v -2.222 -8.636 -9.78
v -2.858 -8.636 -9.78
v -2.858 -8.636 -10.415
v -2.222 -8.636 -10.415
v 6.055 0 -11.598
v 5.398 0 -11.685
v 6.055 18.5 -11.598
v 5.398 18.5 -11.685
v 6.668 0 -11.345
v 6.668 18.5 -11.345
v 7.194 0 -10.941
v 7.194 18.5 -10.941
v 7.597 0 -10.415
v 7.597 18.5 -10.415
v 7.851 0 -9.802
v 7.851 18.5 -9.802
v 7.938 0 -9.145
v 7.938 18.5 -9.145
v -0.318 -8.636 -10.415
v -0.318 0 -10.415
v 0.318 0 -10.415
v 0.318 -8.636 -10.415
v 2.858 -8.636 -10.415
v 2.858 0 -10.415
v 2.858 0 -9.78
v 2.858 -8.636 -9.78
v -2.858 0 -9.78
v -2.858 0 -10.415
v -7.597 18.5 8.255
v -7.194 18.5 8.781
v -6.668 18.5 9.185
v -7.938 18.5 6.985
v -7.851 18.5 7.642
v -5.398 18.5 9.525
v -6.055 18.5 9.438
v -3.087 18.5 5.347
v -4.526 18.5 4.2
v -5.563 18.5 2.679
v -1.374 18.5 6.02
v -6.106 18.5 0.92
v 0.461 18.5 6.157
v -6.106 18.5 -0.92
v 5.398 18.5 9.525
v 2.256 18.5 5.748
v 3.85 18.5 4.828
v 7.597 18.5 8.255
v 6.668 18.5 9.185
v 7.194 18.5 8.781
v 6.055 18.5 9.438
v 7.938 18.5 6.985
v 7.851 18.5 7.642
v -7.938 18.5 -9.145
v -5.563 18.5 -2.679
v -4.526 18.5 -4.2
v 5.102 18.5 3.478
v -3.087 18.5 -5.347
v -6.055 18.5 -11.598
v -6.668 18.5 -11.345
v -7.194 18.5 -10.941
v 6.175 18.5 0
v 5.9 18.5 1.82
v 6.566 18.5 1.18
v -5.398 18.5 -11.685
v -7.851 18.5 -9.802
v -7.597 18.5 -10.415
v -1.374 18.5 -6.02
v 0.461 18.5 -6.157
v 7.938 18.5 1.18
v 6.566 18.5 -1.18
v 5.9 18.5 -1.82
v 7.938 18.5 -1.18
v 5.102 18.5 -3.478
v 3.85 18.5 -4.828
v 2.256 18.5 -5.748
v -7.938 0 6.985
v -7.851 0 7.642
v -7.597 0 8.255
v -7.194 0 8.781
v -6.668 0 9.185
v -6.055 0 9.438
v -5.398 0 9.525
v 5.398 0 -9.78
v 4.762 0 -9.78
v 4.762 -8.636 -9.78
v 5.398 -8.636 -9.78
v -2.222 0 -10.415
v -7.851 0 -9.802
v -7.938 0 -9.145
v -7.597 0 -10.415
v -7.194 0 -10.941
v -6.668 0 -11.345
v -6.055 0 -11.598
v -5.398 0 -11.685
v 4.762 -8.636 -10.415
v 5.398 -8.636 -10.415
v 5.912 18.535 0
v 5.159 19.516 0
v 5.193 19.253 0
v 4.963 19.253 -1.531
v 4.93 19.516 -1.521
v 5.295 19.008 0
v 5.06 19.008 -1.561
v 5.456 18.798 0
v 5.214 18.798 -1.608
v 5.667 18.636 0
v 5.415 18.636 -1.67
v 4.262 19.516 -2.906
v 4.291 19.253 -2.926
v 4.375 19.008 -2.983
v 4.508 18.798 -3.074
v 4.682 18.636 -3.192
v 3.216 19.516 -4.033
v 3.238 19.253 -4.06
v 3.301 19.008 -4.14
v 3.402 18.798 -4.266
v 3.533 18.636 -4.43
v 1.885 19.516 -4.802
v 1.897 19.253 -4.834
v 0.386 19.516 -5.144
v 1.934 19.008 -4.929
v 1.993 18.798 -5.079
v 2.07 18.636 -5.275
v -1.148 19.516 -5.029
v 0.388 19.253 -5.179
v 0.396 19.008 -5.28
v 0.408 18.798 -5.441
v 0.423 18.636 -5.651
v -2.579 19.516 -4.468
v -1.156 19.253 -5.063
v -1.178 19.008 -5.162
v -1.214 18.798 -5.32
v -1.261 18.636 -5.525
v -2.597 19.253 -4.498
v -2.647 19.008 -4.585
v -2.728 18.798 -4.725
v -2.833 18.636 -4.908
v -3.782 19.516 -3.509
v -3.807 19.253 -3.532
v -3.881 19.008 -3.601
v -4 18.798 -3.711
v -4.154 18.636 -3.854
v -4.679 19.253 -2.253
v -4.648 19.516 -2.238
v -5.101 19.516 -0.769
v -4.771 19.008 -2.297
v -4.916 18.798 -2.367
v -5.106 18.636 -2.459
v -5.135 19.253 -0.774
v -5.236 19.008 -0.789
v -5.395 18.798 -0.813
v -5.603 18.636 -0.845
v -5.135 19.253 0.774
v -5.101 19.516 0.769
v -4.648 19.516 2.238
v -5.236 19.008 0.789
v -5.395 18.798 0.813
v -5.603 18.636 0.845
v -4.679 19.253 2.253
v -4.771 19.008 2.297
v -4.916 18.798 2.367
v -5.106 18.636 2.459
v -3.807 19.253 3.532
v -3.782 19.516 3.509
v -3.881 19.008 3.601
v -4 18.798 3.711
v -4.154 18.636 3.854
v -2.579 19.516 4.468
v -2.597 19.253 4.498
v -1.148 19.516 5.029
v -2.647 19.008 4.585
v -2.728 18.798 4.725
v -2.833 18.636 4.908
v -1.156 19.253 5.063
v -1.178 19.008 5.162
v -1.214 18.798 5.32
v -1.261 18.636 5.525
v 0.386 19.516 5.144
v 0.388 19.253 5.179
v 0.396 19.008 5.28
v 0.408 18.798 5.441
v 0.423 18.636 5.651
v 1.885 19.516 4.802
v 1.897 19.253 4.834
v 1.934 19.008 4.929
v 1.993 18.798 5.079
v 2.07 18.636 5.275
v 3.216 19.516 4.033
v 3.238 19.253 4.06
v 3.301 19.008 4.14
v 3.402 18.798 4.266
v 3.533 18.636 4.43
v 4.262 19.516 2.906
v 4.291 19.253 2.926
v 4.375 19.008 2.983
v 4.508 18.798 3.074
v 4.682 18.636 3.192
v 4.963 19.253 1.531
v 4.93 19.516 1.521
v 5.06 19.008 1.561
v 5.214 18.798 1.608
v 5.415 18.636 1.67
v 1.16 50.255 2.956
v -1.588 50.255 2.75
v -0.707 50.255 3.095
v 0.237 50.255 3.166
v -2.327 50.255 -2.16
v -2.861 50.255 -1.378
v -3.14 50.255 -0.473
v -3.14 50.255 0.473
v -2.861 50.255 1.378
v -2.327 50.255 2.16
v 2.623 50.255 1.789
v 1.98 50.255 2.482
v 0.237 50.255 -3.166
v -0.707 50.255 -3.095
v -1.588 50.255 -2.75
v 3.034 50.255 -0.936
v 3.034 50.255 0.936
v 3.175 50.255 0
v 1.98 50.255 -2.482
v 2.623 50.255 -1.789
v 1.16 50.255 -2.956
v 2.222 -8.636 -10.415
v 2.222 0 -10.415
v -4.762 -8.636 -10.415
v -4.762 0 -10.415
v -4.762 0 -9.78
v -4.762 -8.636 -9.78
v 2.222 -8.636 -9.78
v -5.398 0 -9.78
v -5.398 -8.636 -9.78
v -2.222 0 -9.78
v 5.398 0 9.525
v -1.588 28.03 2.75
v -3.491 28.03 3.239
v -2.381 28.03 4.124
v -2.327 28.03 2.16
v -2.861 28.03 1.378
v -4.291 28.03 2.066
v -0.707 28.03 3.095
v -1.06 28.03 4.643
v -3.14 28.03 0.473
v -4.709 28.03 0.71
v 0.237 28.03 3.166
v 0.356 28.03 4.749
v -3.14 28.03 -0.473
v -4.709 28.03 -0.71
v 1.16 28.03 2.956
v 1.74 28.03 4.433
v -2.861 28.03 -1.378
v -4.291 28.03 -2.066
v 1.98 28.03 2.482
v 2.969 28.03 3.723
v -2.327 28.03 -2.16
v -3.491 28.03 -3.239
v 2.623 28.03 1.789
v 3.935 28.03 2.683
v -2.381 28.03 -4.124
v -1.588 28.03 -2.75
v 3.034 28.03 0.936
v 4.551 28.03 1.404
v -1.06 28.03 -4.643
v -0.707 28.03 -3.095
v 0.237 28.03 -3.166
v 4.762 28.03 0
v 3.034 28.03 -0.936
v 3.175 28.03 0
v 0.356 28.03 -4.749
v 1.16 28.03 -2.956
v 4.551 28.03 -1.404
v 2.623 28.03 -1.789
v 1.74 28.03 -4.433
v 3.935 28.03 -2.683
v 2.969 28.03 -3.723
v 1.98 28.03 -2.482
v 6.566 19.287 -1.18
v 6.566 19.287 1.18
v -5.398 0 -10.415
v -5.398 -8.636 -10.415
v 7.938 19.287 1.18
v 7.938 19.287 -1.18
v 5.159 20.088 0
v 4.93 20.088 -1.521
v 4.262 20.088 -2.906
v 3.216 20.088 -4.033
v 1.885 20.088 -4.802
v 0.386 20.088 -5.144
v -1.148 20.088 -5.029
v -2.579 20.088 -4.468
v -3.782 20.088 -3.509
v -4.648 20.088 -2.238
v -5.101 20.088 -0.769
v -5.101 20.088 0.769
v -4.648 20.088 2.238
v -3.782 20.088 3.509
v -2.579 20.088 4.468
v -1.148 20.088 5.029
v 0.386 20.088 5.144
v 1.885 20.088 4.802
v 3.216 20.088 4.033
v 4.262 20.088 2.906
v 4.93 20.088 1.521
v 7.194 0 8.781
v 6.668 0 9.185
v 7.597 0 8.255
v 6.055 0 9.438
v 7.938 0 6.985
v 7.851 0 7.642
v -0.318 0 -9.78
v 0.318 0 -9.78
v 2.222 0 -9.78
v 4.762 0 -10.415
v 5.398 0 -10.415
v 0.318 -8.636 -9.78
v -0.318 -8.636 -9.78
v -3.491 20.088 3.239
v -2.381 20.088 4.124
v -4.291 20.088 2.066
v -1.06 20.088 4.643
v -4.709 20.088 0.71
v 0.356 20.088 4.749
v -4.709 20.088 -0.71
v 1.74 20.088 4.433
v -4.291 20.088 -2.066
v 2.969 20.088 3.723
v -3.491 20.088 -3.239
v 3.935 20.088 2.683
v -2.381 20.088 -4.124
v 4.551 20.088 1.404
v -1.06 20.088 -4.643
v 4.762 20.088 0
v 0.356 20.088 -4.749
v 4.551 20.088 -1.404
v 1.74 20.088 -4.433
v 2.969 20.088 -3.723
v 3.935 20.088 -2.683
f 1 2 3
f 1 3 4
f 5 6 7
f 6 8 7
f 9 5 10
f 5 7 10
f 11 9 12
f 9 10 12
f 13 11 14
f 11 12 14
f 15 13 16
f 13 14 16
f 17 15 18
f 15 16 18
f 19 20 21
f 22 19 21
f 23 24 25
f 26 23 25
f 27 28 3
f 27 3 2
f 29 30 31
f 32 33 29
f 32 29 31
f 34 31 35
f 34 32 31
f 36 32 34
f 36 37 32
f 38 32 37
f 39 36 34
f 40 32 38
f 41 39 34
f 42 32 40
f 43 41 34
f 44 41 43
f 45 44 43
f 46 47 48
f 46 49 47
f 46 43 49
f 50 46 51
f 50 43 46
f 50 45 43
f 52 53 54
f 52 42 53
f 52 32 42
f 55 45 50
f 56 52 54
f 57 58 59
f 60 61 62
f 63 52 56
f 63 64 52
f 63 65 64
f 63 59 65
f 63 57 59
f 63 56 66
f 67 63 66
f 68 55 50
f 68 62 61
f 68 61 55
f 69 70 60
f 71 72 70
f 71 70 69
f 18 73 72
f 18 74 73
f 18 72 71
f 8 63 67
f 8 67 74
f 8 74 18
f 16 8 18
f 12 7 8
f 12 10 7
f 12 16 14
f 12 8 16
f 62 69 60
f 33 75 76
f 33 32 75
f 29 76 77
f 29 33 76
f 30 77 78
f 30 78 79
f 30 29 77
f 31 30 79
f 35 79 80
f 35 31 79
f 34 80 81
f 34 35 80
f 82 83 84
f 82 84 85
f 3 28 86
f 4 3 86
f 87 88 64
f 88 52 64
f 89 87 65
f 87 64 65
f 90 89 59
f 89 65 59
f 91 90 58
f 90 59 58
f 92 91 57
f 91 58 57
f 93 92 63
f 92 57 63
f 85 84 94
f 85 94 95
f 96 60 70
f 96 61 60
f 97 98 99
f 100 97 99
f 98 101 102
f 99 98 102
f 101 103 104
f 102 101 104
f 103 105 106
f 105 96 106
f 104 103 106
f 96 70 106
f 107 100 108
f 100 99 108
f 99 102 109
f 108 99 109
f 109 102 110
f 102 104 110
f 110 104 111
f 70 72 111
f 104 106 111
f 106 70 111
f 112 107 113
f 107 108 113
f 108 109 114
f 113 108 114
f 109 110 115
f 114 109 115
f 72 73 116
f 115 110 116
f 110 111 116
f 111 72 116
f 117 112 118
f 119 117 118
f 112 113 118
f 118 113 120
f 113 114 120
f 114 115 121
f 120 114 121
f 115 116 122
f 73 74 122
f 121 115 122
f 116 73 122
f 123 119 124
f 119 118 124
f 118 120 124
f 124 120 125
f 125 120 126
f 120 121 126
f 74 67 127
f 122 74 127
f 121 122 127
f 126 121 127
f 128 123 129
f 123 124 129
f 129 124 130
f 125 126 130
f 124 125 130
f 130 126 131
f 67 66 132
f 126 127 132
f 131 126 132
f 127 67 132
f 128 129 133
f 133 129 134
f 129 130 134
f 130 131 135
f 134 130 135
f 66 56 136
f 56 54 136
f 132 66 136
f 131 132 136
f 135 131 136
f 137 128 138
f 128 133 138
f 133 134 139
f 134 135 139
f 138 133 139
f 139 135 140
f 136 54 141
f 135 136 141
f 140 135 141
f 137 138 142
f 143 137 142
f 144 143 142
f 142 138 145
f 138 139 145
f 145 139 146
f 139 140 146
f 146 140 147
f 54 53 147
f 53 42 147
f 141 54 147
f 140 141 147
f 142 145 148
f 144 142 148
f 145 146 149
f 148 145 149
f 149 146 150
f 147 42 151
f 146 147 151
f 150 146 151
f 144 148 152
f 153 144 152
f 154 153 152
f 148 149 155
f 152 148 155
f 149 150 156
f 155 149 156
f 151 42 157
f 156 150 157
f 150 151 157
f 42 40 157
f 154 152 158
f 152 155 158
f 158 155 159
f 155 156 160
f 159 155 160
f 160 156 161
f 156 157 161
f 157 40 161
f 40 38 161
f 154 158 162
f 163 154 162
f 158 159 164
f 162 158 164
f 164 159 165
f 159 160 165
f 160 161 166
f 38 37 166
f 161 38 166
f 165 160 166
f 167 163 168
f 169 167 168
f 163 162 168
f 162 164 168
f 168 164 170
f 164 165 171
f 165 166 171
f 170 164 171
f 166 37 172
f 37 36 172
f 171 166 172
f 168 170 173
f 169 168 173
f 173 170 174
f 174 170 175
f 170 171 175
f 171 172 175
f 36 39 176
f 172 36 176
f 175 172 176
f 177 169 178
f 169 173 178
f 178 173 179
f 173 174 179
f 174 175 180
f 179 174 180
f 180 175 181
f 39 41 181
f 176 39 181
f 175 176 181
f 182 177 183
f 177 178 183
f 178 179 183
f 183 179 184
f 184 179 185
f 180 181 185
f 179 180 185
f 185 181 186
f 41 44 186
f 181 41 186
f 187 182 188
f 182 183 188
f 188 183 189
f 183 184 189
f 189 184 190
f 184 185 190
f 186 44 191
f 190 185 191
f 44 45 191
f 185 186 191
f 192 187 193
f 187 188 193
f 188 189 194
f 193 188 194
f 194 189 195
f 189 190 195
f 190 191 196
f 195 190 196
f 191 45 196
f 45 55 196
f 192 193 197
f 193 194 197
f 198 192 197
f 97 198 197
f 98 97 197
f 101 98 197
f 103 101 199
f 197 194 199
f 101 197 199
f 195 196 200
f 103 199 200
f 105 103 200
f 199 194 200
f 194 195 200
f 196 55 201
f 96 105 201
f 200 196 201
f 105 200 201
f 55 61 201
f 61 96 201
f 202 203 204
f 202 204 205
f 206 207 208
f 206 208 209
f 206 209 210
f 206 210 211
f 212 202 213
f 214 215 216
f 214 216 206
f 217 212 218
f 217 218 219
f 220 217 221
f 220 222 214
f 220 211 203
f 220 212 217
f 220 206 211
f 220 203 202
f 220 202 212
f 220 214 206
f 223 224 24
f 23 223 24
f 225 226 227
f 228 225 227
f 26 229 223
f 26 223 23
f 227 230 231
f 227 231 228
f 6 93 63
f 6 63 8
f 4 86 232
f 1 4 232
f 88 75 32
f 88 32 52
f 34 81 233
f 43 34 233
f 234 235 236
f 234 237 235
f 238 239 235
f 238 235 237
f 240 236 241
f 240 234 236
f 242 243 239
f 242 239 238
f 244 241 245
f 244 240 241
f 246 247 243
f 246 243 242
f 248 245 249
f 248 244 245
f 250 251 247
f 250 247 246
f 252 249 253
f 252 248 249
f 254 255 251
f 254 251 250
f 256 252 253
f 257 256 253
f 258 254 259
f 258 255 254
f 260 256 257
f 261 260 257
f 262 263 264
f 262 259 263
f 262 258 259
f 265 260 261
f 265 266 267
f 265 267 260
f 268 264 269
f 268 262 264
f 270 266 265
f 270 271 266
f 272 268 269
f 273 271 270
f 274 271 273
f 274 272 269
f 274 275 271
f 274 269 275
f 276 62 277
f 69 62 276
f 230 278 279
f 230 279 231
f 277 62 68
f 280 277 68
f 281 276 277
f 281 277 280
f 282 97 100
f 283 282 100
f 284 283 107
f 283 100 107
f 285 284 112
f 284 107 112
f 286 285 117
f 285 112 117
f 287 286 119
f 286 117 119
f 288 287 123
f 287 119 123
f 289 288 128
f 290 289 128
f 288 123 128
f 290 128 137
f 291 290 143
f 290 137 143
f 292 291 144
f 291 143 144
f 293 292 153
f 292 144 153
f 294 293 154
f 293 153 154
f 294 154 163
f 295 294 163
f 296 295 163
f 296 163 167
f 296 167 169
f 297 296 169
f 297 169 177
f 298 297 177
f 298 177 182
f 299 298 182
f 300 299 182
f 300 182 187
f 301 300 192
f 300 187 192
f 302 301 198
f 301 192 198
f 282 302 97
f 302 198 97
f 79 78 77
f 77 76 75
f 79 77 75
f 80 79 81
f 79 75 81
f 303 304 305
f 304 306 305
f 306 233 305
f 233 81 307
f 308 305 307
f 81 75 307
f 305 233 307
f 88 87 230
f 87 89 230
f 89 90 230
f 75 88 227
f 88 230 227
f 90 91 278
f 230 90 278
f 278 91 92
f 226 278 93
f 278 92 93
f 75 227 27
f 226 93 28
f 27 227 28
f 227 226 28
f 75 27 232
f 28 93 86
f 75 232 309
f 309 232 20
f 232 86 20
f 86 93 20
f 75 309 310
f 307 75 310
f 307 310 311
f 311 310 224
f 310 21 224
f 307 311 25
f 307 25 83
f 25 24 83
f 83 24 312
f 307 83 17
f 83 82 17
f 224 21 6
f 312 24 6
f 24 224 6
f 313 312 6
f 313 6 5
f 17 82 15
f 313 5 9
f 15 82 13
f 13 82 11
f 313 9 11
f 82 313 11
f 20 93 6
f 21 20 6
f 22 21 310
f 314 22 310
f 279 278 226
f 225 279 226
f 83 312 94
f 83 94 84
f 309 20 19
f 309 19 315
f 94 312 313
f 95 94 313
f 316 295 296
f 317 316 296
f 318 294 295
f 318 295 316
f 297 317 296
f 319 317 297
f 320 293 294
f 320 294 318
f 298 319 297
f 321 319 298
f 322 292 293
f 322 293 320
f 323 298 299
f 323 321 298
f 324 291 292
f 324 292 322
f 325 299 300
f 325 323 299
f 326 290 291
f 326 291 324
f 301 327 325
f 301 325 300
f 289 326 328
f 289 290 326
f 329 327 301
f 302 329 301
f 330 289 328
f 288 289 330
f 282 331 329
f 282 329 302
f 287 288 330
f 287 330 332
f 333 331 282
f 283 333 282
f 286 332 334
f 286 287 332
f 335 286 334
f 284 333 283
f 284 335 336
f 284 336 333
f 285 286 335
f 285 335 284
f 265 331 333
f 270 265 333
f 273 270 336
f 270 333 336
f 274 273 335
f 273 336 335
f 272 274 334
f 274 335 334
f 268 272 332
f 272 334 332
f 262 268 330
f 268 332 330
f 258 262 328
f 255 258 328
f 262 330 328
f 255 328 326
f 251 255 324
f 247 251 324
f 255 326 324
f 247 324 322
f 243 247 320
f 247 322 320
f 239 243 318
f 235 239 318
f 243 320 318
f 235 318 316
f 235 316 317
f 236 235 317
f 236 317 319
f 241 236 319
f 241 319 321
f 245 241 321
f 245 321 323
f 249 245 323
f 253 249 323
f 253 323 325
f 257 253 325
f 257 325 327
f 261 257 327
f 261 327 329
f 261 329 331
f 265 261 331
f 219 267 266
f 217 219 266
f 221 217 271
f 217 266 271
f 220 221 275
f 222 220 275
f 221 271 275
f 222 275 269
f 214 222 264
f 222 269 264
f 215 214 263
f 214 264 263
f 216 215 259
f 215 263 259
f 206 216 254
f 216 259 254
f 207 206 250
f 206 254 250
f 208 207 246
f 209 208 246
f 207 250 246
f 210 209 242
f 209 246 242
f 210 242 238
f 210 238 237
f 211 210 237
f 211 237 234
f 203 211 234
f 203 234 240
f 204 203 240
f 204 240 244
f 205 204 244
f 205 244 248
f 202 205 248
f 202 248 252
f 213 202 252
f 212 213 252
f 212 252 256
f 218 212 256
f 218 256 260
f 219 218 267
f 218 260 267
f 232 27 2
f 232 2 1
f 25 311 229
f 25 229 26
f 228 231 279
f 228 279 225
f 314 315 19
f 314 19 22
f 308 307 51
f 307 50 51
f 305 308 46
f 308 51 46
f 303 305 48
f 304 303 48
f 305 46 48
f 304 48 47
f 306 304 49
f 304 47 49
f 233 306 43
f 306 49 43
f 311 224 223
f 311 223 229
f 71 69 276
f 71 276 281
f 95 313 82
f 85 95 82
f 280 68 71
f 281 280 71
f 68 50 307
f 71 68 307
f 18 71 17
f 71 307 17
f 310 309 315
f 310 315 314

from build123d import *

# Parameters (mm, degrees)
SKETCH1_W               = 15.875
SKETCH1_H               = 21.21
BODY_DEPTH              = 18.5
SKETCH2_R               = 4.7625
EXTRUDE_3_8_32_DEPTH    = 9.53
SKETCH4_R               = 3.175
SHAFT_DEPTH             = 22.225
SKETCH5_R               = 5.15874
BOSS_DEPTH              = 1.5875
SKETCH6_W               = 1.3716
SKETCH6_H               = 2.36
ANTI_ROTATION_LUG_DEPTH = 0.7874
SKETCH7_W               = 0.635
SKETCH7_H               = 0.635
PINS_DEPTH              = 8.636
FILLET1_R               = 1.016
FILLET2_R               = 2.54


with BuildPart() as part:
    # Sketch1 → body (new body)
    with BuildSketch(Plane(origin=(0, 0, 0), x_dir=(1, 0, 0), z_dir=(0, 1, 0))):
        with Locations((0, 1.08)):
            Rectangle(SKETCH1_W, SKETCH1_H)
    extrude(amount=BODY_DEPTH)

    # Sketch2 → 3/8-32 (add)
    with BuildSketch(Plane(origin=(0, 18.5, 0), x_dir=(1, 0, 0), z_dir=(0, 1, 0))):
        Circle(SKETCH2_R)
    extrude(amount=EXTRUDE_3_8_32_DEPTH)

    # Sketch4 → shaft (add)
    with BuildSketch(Plane(origin=(0, 28.03, 0), x_dir=(1, 0, 0), z_dir=(0, 1, 0))):
        Circle(SKETCH4_R)
    extrude(amount=SHAFT_DEPTH)

    # Sketch5 → boss (add)
    with BuildSketch(Plane(origin=(0, 18.5, 0), x_dir=(1, 0, 0), z_dir=(0, 1, 0))):
        Circle(SKETCH5_R)
    extrude(amount=BOSS_DEPTH)

    # Sketch6 → anti-rotation lug (add)
    with BuildSketch(Plane(origin=(0, 18.5, 0), x_dir=(1, 0, 0), z_dir=(0, 1, 0))):
        with Locations((7.2517, 0)):
            Rectangle(SKETCH6_W, SKETCH6_H)
    extrude(amount=ANTI_ROTATION_LUG_DEPTH)

    # Sketch7 → pins (add)
    with BuildSketch(Plane.XZ):
        with Locations((-5.08, -10.0975)):
            Rectangle(SKETCH7_W, SKETCH7_H)
        with Locations((-2.54, -10.0975)):
            Rectangle(SKETCH7_W, SKETCH7_H)
        with Locations((0, -10.0975)):
            Rectangle(SKETCH7_W, SKETCH7_H)
        with Locations((2.54, -10.0975)):
            Rectangle(SKETCH7_W, SKETCH7_H)
        with Locations((5.08, -10.0975)):
            Rectangle(SKETCH7_W, SKETCH7_H)
    extrude(amount=PINS_DEPTH)

    # Fillet1
    fillet1_edges = [part.edges().sort_by_distance(p)[0] for p in [
        (-5.15874, 18.5, 0),
    ]]
    fillet(fillet1_edges, radius=FILLET1_R)

    # Fillet2
    fillet2_edges = [part.edges().sort_by_distance(p)[0] for p in [
        (7.9375, 9.25, 9.525),
        (-7.9375, 9.25, 9.525),
        (-7.9375, 9.25, -11.685),
        (7.9375, 9.25, -11.685),
    ]]
    fillet(fillet2_edges, radius=FILLET2_R)


solid = part.part
